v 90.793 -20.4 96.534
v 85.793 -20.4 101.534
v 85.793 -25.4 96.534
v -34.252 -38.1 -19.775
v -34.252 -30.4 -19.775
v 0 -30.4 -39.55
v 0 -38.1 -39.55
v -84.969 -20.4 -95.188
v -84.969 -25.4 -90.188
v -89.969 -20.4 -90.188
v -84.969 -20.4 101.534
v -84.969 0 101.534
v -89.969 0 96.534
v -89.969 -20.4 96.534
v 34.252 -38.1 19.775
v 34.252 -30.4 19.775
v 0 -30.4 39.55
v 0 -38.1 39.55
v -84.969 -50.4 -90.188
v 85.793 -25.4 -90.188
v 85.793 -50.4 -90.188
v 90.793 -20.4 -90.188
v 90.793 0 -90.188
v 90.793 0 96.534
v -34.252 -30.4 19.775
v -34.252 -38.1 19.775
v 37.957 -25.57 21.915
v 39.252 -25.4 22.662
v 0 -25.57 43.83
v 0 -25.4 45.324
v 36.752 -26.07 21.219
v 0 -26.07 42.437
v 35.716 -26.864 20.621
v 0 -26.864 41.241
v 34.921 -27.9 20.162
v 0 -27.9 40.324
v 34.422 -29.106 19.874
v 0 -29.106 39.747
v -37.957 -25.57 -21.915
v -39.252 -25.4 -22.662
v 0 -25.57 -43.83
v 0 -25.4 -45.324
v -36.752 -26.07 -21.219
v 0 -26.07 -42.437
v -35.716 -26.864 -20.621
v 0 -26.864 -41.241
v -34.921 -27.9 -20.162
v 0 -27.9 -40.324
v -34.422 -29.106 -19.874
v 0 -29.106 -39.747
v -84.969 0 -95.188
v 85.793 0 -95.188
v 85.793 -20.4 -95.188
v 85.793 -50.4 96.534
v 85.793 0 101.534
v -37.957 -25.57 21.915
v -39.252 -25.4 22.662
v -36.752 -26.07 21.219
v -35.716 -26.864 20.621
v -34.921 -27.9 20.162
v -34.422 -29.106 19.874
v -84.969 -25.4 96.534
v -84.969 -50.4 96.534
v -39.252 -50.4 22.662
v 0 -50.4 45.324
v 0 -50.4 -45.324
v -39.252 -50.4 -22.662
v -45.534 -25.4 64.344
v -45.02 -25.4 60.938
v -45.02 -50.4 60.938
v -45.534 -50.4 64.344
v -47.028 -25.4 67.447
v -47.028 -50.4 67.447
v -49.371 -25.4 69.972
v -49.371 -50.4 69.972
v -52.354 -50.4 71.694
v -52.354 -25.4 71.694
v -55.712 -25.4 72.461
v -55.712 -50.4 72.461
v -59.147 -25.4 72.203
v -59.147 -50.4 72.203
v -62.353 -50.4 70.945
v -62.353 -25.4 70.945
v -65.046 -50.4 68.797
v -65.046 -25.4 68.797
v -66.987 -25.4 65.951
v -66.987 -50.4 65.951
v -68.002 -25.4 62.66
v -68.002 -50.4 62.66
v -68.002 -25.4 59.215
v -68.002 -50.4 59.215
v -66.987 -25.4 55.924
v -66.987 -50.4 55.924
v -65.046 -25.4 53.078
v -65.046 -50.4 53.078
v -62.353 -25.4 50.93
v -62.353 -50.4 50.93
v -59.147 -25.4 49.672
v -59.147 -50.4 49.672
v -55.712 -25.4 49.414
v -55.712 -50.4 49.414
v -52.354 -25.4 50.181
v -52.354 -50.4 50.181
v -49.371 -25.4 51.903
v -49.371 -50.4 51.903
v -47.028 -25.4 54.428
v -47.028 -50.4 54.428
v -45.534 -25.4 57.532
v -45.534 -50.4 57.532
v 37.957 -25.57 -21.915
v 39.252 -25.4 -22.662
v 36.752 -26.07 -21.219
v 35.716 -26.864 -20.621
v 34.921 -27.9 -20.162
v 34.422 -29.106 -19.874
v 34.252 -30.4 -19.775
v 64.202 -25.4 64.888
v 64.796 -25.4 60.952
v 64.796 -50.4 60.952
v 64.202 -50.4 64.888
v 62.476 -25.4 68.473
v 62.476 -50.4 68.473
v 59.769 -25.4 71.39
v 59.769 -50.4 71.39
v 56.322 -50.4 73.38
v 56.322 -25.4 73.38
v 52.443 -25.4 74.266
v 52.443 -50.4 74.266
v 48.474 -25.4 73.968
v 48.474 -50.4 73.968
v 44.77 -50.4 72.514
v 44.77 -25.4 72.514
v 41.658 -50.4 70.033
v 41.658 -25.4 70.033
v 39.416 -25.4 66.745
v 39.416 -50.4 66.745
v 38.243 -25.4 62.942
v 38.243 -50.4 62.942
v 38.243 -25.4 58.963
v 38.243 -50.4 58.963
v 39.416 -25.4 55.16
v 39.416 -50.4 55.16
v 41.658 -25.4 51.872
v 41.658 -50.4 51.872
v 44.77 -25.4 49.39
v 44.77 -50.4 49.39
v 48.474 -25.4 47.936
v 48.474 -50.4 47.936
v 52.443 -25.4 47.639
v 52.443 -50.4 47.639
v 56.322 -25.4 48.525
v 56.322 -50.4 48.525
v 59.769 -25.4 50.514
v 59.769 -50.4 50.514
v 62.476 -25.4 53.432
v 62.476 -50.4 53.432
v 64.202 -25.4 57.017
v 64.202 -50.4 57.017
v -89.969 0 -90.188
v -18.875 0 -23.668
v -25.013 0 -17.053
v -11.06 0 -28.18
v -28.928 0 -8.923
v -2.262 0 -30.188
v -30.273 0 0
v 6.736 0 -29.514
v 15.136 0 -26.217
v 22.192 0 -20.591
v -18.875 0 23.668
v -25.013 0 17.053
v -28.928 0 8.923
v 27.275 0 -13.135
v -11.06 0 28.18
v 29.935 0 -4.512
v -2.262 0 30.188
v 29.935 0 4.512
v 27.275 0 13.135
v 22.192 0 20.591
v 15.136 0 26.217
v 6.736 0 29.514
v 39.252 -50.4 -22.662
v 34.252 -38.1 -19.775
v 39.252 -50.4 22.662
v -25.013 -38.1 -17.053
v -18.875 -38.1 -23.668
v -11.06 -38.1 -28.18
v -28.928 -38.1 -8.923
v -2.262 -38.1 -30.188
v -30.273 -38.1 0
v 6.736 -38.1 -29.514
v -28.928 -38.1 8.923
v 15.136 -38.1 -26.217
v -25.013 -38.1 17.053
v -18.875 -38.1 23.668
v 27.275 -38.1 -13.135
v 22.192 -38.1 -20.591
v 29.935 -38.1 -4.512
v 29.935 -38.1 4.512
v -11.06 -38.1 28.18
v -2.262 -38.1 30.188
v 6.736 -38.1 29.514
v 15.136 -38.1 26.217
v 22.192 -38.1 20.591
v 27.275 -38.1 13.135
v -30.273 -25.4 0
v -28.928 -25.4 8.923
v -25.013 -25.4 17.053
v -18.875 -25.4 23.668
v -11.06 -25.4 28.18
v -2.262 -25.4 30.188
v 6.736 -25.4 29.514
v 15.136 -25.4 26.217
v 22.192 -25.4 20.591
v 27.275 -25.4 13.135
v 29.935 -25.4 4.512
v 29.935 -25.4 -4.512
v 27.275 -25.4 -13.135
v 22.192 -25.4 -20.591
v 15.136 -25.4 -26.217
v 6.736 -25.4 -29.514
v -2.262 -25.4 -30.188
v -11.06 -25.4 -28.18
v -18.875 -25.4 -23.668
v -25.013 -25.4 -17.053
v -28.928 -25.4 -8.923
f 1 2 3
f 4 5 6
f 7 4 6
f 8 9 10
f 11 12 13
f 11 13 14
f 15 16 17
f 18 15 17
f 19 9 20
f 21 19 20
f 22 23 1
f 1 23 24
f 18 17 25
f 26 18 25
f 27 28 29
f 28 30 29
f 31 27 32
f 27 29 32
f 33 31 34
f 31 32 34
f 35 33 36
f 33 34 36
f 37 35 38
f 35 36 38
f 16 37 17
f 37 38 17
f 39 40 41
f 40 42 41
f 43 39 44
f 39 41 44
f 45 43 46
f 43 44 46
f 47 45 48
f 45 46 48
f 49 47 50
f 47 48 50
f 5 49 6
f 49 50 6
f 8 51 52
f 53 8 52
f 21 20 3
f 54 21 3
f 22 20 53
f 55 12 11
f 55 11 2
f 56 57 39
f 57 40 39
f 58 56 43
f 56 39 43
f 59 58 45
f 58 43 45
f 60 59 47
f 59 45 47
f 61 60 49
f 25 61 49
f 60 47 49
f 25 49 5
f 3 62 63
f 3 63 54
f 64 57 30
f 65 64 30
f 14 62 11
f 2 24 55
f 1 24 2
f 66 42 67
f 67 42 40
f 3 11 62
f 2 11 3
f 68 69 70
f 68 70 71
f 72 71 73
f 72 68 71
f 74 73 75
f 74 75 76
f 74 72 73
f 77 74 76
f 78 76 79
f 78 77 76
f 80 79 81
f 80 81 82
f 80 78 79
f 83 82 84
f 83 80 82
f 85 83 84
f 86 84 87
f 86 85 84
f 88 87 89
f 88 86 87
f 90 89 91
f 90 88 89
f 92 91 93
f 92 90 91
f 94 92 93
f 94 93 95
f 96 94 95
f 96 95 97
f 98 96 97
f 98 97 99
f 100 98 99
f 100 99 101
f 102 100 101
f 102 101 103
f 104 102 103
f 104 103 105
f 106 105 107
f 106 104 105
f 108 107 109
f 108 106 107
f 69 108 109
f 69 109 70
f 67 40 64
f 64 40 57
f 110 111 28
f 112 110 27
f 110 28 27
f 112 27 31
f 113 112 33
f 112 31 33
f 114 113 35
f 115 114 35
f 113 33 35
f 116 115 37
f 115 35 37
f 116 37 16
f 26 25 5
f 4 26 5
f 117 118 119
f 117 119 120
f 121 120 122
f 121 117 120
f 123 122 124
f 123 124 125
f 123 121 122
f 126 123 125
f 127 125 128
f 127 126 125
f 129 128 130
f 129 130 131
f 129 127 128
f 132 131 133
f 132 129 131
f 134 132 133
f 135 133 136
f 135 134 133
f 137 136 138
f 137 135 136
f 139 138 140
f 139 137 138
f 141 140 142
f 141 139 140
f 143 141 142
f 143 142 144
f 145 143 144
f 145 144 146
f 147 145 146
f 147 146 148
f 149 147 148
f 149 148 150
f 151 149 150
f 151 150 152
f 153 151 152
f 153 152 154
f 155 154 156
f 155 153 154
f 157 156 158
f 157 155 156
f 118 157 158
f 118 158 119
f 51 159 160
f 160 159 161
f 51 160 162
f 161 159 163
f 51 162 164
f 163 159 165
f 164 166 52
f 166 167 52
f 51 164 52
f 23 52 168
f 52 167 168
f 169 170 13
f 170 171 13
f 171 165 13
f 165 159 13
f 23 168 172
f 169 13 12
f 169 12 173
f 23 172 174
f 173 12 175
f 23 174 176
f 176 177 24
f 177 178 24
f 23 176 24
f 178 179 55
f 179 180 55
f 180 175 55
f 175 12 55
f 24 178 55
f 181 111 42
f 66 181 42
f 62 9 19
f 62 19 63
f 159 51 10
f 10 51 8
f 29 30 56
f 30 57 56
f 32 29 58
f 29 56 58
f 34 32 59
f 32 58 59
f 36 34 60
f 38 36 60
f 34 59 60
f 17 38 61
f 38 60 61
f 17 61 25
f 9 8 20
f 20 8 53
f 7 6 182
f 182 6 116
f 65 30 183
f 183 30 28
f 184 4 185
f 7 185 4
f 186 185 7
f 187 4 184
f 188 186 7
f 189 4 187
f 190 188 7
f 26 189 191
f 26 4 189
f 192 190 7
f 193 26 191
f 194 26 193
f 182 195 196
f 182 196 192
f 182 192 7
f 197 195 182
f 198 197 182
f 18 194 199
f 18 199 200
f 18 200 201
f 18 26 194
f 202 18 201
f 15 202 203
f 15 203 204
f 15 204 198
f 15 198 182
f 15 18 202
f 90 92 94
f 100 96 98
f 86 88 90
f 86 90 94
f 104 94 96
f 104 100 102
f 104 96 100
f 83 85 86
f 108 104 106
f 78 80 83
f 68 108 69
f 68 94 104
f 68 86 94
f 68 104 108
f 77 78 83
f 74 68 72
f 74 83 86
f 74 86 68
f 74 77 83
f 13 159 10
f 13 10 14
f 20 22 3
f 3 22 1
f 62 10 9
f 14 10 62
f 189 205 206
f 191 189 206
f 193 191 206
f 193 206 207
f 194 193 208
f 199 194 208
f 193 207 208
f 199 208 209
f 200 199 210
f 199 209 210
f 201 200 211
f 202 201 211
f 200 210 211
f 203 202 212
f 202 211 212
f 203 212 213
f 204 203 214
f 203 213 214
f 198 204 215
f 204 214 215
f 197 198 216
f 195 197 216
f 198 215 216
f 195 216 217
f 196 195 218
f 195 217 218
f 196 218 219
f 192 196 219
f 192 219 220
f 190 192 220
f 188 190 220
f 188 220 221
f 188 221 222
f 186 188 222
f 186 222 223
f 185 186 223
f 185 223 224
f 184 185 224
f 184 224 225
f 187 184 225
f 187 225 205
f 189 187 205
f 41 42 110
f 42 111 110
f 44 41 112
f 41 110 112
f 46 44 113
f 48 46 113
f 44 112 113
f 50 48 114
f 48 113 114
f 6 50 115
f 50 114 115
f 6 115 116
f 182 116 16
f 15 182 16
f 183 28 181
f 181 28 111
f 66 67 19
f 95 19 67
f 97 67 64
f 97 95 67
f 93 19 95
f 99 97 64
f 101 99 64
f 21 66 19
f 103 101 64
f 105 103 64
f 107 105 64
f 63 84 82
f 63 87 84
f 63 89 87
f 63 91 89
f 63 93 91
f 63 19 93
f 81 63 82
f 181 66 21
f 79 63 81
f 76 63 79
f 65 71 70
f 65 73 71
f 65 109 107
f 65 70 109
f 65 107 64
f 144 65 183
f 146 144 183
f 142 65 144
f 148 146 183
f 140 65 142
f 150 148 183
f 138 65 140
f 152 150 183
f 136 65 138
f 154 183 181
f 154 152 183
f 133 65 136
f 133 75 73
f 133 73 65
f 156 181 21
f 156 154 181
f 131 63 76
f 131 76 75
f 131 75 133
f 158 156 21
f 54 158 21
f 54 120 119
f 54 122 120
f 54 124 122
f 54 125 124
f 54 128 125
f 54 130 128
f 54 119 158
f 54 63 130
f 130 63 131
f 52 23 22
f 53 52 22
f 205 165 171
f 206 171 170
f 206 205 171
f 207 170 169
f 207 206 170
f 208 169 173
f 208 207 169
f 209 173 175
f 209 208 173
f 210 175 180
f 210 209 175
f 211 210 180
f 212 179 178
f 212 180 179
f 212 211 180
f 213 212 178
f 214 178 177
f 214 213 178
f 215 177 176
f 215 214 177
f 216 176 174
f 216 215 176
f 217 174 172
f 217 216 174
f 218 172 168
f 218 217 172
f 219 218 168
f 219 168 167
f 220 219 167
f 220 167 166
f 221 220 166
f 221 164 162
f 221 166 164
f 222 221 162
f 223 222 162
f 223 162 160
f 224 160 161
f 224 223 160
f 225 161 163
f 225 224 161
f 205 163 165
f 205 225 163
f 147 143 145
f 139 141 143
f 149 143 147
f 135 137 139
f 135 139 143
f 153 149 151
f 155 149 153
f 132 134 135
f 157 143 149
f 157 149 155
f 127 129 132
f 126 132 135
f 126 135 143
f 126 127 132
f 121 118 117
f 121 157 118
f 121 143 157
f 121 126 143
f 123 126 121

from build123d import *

# Parameters (mm, degrees)
F1_DEPTH  = 38.1
F3_R      = 30.2729737571
F4_DEPTH  = 94.742
F5_W      = 180.7619705796
F5_H      = 196.721881628
F6_DEPTH  = 25.4
F7_DEPTH  = 107.1100030094
F8_R      = 5
F9_SIZE   = 5
F11_W     = 170.7619705796
F11_H     = 186.721881628
F11_R     = 11.555445332
F11_R_2   = 13.3506180186
F12_DEPTH = 25


with BuildPart() as f1:
    # F0 (on Front) → F1 (new body)
    with BuildSketch(Plane.XZ):
        Polygon((34.2515595257, -19.7751471123), (34.2515595257, 19.7751471123), (0, 39.5502942247), (-34.2515595257, 19.7751471123), (-34.2515595257, -19.7751471123), (0, -39.5502942247), align=None)
    extrude(amount=F1_DEPTH)

    # F3 (on face) → F4 (cut)
    with BuildSketch(Plane(origin=(0, 0, 0), x_dir=(-1, 0, 0), z_dir=(0, 1, 0))):
        Circle(F3_R)
    extrude(amount=-F4_DEPTH, mode=Mode.SUBTRACT)

    # F5 (on Front) → F6 (join)
    with BuildSketch(Plane.XZ):
        with Locations((0.411581248, 3.1727701426)):
            Rectangle(F5_W, F5_H)
    extrude(amount=F6_DEPTH)

    # F7 (cut): a face of the model
    f7_faces = [f1.faces().sort_by_distance(p)[0] for p in [
        (0, -25.4, 0),
    ]]
    extrude(f7_faces, amount=-F7_DEPTH, mode=Mode.SUBTRACT)

    # F8
    f8_edges = [f1.edges().sort_by_distance(p)[0] for p in [
        (17.12578, -25.4, 29.662721),
        (-17.12578, -25.4, 29.662721),
        (34.25156, -25.4, 0),
        (17.12578, -25.4, -29.662721),
        (-17.12578, -25.4, -29.662721),
        (-34.25156, -25.4, 0),
    ]]
    fillet(f8_edges, radius=F8_R)

    # F9
    f9_edges = [f1.edges().sort_by_distance(p)[0] for p in [
        (90.792567, -12.7, 101.533711),
        (19.62578, -25.4, 33.992848),
        (39.25156, -25.4, 0),
        (-19.62578, -25.4, 33.992848),
        (19.62578, -25.4, -33.992848),
        (-39.25156, -25.4, 0),
        (-19.62578, -25.4, -33.992848),
        (0.411581, -25.4, 101.533711),
        (90.792567, -25.4, 3.17277),
        (-89.969404, -25.4, 3.17277),
        (0.411581, -25.4, -95.188171),
        (-89.969404, -12.7, 101.533711),
        (-89.969404, -12.7, -95.188171),
        (90.792567, -12.7, -95.188171),
    ]]
    chamfer(f9_edges, length=F9_SIZE)

    # F11 (on face) → F12 (join)
    with BuildSketch(Plane.XZ.offset(25.4)):
        with Locations((0.411581248, 3.1727701426)):
            Rectangle(F11_W, F11_H)
        Polygon((-39.2515595257, -22.6618984583), (-39.2515595257, 22.6618984583), (0, 45.3237969166), (39.2515595257, 22.6618984583), (39.2515595257, -22.6618984583), (0, -45.3237969166), align=None, mode=Mode.SUBTRACT)
        with Locations((-56.5757006407, 60.9375908971)):
            Circle(F11_R, mode=Mode.SUBTRACT)
        with Locations((51.4449626207, 60.9523579478)):
            Circle(F11_R_2, mode=Mode.SUBTRACT)
    extrude(amount=F12_DEPTH)


solid = f1.part
